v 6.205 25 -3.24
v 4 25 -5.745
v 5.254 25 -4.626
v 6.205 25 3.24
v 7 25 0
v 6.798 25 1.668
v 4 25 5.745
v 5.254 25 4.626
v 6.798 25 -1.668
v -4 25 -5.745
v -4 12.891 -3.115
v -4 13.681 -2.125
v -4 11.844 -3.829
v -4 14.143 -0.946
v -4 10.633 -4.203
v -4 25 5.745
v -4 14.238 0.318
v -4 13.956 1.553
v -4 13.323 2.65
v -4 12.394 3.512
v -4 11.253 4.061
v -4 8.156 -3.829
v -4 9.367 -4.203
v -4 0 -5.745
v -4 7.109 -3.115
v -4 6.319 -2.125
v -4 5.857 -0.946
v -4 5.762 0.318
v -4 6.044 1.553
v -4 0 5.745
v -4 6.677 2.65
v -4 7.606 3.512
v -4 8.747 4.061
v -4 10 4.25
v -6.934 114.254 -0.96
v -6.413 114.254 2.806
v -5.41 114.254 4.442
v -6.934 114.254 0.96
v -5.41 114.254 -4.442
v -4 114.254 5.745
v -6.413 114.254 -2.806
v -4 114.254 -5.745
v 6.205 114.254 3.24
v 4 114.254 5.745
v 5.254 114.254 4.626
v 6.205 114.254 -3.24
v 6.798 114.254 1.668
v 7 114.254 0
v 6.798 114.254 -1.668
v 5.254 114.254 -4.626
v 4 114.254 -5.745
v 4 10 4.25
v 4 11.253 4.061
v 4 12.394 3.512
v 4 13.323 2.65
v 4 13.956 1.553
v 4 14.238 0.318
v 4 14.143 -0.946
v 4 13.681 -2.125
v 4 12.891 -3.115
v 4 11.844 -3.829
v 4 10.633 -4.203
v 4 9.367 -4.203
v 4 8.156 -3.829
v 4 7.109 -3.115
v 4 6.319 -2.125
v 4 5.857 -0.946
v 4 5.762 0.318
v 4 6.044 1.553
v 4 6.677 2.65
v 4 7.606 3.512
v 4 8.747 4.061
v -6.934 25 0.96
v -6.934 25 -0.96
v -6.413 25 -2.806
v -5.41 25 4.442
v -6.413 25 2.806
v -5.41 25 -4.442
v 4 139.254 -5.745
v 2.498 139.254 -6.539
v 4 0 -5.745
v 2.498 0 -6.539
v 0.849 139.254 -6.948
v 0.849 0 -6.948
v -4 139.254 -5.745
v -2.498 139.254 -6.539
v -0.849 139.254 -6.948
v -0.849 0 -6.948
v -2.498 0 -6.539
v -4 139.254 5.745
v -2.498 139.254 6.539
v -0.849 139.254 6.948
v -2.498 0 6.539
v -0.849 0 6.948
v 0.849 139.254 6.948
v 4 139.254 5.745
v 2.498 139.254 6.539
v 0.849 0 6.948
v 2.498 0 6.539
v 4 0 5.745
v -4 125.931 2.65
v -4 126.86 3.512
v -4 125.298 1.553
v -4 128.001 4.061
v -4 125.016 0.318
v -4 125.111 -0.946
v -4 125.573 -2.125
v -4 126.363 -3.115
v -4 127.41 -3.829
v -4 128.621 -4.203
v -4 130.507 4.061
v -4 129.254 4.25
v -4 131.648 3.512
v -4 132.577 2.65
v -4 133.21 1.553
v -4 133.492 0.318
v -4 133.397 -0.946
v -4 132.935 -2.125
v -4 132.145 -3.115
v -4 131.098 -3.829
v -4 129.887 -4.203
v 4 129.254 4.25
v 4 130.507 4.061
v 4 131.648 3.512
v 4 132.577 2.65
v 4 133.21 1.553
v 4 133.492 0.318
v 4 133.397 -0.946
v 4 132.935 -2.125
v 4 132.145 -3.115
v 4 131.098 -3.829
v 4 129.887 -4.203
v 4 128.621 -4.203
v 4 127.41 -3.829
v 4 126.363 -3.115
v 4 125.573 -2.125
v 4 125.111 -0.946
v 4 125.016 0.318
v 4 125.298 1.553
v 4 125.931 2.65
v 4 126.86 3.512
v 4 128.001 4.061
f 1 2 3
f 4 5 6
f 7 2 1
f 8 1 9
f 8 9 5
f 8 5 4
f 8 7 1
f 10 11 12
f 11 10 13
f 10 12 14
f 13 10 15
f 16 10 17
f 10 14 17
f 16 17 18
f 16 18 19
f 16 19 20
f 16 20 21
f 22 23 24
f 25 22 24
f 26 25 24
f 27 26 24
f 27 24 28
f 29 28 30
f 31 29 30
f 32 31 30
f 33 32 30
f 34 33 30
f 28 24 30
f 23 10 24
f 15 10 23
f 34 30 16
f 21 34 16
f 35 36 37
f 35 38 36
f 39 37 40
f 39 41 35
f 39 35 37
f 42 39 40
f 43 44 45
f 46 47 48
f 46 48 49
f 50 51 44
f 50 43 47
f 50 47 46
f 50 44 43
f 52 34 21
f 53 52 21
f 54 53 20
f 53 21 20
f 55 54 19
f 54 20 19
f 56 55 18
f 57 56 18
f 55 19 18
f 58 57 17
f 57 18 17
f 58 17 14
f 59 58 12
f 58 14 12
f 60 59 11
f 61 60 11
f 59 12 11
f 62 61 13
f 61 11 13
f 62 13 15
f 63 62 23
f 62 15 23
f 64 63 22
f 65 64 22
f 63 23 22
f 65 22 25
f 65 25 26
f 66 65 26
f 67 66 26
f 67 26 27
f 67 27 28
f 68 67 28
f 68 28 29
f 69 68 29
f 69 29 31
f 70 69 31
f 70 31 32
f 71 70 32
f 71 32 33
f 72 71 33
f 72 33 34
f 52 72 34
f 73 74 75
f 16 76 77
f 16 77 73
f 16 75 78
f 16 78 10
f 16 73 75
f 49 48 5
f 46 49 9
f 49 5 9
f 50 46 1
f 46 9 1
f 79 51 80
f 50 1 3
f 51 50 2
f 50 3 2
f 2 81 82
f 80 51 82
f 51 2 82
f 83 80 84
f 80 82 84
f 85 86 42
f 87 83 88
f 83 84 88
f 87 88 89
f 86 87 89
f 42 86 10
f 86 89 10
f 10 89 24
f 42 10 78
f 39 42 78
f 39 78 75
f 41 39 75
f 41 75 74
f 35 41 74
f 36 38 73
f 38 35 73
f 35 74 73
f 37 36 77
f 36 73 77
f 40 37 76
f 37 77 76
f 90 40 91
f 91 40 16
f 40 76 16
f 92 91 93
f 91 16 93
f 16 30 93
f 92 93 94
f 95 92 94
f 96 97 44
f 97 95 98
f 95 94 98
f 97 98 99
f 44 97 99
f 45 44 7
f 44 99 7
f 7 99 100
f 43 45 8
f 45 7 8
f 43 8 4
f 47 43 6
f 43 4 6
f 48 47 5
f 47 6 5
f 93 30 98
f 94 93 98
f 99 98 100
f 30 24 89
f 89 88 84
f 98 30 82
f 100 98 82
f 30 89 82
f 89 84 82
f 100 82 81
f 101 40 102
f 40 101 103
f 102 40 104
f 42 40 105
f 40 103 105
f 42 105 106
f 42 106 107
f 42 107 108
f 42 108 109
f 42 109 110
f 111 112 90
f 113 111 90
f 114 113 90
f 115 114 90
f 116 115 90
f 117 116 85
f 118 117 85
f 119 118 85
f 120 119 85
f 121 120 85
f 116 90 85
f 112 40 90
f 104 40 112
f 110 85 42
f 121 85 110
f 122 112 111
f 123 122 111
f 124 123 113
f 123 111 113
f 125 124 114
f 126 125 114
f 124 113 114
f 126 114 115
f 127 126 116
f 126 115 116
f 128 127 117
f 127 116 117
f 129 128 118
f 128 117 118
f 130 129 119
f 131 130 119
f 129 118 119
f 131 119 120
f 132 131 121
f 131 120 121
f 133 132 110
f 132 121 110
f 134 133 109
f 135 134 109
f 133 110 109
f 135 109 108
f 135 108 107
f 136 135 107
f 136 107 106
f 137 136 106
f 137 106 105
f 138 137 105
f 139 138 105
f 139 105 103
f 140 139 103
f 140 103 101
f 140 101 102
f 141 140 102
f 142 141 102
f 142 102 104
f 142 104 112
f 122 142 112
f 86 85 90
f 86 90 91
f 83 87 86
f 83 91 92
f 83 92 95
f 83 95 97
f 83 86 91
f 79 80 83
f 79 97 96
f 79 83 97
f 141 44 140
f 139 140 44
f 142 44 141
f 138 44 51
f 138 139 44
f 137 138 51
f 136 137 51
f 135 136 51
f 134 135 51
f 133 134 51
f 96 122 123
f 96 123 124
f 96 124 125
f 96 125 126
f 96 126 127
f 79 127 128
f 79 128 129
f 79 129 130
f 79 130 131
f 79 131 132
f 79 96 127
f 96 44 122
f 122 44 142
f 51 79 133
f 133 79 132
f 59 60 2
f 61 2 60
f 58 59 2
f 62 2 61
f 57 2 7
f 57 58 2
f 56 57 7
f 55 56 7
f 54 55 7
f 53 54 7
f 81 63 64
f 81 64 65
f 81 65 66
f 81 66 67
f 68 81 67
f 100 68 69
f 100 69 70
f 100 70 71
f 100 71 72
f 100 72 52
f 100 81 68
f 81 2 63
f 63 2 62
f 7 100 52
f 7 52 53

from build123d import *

# Parameters (mm, degrees)
SKETCH1_R                        = 7
BOSS_EXTRUDE1_DEPTH              = 139.254
SKETCH3_W                        = 3.842840079
SKETCH3_H                        = 19.362001934
SKETCH3_W_2                      = 3.621137766
CUT_EXTRUDE1_DEPTH               = 25
SKETCH4_W                        = 4.298001377
SKETCH4_H                        = 18.624672635
SKETCH4_W_2                      = 5.056472209
SKETCH4_H_2                      = 19.003908051
CUT_EXTRUDE2_DEPTH               = 25
TAP_DRILL_FOR_M10X1_5_TAP1_D     = 8.5
TAP_DRILL_FOR_M10X1_5_TAP1_DEPTH = 20
TAP_DRILL_FOR_M10X1_5_TAP1_TIP   = 2.553657631


with BuildPart() as part:
    # Sketch1 → Boss-Extrude1 (new body)
    with BuildSketch(Plane(origin=(0, 0, 0), x_dir=(1, 0, 0), z_dir=(0, 1, 0))):
        Circle(SKETCH1_R)
    extrude(amount=BOSS_EXTRUDE1_DEPTH)

    # Sketch3 → Cut-Extrude1 (cut)
    with BuildSketch(Plane.XZ):
        with Locations((5.92142004, -0.588495195)):
            Rectangle(SKETCH3_W, SKETCH3_H)
        with Locations((-5.810568883, -0.588495195)):
            Rectangle(SKETCH3_W_2, SKETCH3_H)
    extrude(amount=-CUT_EXTRUDE1_DEPTH, mode=Mode.SUBTRACT)

    # Sketch4 → Cut-Extrude2 (cut)
    with BuildSketch(Plane(origin=(0, 139.254, 0), x_dir=(1, 0, 0), z_dir=(0, 1, 0))):
        with Locations((-6.149000689, -0.400304049)):
            Rectangle(SKETCH4_W, SKETCH4_H)
        with Locations((6.528236105, -0.589921757)):
            Rectangle(SKETCH4_W_2, SKETCH4_H_2)
    extrude(amount=-CUT_EXTRUDE2_DEPTH, mode=Mode.SUBTRACT)

    # Tap Drill for M10x1.5 Tap1
    with Locations(Plane(origin=(4, 0, 0), x_dir=(0, 0, -1), z_dir=(1, 0, 0))):
        with Locations((0, 129.254), (0, 10)):
            Hole(TAP_DRILL_FOR_M10X1_5_TAP1_D / 2, depth=TAP_DRILL_FOR_M10X1_5_TAP1_DEPTH)
            with Locations((0, 0, -(TAP_DRILL_FOR_M10X1_5_TAP1_DEPTH + TAP_DRILL_FOR_M10X1_5_TAP1_TIP / 2))):  # 118° drill point
                Cone(0, TAP_DRILL_FOR_M10X1_5_TAP1_D / 2, TAP_DRILL_FOR_M10X1_5_TAP1_TIP, mode=Mode.SUBTRACT)


solid = part.part
